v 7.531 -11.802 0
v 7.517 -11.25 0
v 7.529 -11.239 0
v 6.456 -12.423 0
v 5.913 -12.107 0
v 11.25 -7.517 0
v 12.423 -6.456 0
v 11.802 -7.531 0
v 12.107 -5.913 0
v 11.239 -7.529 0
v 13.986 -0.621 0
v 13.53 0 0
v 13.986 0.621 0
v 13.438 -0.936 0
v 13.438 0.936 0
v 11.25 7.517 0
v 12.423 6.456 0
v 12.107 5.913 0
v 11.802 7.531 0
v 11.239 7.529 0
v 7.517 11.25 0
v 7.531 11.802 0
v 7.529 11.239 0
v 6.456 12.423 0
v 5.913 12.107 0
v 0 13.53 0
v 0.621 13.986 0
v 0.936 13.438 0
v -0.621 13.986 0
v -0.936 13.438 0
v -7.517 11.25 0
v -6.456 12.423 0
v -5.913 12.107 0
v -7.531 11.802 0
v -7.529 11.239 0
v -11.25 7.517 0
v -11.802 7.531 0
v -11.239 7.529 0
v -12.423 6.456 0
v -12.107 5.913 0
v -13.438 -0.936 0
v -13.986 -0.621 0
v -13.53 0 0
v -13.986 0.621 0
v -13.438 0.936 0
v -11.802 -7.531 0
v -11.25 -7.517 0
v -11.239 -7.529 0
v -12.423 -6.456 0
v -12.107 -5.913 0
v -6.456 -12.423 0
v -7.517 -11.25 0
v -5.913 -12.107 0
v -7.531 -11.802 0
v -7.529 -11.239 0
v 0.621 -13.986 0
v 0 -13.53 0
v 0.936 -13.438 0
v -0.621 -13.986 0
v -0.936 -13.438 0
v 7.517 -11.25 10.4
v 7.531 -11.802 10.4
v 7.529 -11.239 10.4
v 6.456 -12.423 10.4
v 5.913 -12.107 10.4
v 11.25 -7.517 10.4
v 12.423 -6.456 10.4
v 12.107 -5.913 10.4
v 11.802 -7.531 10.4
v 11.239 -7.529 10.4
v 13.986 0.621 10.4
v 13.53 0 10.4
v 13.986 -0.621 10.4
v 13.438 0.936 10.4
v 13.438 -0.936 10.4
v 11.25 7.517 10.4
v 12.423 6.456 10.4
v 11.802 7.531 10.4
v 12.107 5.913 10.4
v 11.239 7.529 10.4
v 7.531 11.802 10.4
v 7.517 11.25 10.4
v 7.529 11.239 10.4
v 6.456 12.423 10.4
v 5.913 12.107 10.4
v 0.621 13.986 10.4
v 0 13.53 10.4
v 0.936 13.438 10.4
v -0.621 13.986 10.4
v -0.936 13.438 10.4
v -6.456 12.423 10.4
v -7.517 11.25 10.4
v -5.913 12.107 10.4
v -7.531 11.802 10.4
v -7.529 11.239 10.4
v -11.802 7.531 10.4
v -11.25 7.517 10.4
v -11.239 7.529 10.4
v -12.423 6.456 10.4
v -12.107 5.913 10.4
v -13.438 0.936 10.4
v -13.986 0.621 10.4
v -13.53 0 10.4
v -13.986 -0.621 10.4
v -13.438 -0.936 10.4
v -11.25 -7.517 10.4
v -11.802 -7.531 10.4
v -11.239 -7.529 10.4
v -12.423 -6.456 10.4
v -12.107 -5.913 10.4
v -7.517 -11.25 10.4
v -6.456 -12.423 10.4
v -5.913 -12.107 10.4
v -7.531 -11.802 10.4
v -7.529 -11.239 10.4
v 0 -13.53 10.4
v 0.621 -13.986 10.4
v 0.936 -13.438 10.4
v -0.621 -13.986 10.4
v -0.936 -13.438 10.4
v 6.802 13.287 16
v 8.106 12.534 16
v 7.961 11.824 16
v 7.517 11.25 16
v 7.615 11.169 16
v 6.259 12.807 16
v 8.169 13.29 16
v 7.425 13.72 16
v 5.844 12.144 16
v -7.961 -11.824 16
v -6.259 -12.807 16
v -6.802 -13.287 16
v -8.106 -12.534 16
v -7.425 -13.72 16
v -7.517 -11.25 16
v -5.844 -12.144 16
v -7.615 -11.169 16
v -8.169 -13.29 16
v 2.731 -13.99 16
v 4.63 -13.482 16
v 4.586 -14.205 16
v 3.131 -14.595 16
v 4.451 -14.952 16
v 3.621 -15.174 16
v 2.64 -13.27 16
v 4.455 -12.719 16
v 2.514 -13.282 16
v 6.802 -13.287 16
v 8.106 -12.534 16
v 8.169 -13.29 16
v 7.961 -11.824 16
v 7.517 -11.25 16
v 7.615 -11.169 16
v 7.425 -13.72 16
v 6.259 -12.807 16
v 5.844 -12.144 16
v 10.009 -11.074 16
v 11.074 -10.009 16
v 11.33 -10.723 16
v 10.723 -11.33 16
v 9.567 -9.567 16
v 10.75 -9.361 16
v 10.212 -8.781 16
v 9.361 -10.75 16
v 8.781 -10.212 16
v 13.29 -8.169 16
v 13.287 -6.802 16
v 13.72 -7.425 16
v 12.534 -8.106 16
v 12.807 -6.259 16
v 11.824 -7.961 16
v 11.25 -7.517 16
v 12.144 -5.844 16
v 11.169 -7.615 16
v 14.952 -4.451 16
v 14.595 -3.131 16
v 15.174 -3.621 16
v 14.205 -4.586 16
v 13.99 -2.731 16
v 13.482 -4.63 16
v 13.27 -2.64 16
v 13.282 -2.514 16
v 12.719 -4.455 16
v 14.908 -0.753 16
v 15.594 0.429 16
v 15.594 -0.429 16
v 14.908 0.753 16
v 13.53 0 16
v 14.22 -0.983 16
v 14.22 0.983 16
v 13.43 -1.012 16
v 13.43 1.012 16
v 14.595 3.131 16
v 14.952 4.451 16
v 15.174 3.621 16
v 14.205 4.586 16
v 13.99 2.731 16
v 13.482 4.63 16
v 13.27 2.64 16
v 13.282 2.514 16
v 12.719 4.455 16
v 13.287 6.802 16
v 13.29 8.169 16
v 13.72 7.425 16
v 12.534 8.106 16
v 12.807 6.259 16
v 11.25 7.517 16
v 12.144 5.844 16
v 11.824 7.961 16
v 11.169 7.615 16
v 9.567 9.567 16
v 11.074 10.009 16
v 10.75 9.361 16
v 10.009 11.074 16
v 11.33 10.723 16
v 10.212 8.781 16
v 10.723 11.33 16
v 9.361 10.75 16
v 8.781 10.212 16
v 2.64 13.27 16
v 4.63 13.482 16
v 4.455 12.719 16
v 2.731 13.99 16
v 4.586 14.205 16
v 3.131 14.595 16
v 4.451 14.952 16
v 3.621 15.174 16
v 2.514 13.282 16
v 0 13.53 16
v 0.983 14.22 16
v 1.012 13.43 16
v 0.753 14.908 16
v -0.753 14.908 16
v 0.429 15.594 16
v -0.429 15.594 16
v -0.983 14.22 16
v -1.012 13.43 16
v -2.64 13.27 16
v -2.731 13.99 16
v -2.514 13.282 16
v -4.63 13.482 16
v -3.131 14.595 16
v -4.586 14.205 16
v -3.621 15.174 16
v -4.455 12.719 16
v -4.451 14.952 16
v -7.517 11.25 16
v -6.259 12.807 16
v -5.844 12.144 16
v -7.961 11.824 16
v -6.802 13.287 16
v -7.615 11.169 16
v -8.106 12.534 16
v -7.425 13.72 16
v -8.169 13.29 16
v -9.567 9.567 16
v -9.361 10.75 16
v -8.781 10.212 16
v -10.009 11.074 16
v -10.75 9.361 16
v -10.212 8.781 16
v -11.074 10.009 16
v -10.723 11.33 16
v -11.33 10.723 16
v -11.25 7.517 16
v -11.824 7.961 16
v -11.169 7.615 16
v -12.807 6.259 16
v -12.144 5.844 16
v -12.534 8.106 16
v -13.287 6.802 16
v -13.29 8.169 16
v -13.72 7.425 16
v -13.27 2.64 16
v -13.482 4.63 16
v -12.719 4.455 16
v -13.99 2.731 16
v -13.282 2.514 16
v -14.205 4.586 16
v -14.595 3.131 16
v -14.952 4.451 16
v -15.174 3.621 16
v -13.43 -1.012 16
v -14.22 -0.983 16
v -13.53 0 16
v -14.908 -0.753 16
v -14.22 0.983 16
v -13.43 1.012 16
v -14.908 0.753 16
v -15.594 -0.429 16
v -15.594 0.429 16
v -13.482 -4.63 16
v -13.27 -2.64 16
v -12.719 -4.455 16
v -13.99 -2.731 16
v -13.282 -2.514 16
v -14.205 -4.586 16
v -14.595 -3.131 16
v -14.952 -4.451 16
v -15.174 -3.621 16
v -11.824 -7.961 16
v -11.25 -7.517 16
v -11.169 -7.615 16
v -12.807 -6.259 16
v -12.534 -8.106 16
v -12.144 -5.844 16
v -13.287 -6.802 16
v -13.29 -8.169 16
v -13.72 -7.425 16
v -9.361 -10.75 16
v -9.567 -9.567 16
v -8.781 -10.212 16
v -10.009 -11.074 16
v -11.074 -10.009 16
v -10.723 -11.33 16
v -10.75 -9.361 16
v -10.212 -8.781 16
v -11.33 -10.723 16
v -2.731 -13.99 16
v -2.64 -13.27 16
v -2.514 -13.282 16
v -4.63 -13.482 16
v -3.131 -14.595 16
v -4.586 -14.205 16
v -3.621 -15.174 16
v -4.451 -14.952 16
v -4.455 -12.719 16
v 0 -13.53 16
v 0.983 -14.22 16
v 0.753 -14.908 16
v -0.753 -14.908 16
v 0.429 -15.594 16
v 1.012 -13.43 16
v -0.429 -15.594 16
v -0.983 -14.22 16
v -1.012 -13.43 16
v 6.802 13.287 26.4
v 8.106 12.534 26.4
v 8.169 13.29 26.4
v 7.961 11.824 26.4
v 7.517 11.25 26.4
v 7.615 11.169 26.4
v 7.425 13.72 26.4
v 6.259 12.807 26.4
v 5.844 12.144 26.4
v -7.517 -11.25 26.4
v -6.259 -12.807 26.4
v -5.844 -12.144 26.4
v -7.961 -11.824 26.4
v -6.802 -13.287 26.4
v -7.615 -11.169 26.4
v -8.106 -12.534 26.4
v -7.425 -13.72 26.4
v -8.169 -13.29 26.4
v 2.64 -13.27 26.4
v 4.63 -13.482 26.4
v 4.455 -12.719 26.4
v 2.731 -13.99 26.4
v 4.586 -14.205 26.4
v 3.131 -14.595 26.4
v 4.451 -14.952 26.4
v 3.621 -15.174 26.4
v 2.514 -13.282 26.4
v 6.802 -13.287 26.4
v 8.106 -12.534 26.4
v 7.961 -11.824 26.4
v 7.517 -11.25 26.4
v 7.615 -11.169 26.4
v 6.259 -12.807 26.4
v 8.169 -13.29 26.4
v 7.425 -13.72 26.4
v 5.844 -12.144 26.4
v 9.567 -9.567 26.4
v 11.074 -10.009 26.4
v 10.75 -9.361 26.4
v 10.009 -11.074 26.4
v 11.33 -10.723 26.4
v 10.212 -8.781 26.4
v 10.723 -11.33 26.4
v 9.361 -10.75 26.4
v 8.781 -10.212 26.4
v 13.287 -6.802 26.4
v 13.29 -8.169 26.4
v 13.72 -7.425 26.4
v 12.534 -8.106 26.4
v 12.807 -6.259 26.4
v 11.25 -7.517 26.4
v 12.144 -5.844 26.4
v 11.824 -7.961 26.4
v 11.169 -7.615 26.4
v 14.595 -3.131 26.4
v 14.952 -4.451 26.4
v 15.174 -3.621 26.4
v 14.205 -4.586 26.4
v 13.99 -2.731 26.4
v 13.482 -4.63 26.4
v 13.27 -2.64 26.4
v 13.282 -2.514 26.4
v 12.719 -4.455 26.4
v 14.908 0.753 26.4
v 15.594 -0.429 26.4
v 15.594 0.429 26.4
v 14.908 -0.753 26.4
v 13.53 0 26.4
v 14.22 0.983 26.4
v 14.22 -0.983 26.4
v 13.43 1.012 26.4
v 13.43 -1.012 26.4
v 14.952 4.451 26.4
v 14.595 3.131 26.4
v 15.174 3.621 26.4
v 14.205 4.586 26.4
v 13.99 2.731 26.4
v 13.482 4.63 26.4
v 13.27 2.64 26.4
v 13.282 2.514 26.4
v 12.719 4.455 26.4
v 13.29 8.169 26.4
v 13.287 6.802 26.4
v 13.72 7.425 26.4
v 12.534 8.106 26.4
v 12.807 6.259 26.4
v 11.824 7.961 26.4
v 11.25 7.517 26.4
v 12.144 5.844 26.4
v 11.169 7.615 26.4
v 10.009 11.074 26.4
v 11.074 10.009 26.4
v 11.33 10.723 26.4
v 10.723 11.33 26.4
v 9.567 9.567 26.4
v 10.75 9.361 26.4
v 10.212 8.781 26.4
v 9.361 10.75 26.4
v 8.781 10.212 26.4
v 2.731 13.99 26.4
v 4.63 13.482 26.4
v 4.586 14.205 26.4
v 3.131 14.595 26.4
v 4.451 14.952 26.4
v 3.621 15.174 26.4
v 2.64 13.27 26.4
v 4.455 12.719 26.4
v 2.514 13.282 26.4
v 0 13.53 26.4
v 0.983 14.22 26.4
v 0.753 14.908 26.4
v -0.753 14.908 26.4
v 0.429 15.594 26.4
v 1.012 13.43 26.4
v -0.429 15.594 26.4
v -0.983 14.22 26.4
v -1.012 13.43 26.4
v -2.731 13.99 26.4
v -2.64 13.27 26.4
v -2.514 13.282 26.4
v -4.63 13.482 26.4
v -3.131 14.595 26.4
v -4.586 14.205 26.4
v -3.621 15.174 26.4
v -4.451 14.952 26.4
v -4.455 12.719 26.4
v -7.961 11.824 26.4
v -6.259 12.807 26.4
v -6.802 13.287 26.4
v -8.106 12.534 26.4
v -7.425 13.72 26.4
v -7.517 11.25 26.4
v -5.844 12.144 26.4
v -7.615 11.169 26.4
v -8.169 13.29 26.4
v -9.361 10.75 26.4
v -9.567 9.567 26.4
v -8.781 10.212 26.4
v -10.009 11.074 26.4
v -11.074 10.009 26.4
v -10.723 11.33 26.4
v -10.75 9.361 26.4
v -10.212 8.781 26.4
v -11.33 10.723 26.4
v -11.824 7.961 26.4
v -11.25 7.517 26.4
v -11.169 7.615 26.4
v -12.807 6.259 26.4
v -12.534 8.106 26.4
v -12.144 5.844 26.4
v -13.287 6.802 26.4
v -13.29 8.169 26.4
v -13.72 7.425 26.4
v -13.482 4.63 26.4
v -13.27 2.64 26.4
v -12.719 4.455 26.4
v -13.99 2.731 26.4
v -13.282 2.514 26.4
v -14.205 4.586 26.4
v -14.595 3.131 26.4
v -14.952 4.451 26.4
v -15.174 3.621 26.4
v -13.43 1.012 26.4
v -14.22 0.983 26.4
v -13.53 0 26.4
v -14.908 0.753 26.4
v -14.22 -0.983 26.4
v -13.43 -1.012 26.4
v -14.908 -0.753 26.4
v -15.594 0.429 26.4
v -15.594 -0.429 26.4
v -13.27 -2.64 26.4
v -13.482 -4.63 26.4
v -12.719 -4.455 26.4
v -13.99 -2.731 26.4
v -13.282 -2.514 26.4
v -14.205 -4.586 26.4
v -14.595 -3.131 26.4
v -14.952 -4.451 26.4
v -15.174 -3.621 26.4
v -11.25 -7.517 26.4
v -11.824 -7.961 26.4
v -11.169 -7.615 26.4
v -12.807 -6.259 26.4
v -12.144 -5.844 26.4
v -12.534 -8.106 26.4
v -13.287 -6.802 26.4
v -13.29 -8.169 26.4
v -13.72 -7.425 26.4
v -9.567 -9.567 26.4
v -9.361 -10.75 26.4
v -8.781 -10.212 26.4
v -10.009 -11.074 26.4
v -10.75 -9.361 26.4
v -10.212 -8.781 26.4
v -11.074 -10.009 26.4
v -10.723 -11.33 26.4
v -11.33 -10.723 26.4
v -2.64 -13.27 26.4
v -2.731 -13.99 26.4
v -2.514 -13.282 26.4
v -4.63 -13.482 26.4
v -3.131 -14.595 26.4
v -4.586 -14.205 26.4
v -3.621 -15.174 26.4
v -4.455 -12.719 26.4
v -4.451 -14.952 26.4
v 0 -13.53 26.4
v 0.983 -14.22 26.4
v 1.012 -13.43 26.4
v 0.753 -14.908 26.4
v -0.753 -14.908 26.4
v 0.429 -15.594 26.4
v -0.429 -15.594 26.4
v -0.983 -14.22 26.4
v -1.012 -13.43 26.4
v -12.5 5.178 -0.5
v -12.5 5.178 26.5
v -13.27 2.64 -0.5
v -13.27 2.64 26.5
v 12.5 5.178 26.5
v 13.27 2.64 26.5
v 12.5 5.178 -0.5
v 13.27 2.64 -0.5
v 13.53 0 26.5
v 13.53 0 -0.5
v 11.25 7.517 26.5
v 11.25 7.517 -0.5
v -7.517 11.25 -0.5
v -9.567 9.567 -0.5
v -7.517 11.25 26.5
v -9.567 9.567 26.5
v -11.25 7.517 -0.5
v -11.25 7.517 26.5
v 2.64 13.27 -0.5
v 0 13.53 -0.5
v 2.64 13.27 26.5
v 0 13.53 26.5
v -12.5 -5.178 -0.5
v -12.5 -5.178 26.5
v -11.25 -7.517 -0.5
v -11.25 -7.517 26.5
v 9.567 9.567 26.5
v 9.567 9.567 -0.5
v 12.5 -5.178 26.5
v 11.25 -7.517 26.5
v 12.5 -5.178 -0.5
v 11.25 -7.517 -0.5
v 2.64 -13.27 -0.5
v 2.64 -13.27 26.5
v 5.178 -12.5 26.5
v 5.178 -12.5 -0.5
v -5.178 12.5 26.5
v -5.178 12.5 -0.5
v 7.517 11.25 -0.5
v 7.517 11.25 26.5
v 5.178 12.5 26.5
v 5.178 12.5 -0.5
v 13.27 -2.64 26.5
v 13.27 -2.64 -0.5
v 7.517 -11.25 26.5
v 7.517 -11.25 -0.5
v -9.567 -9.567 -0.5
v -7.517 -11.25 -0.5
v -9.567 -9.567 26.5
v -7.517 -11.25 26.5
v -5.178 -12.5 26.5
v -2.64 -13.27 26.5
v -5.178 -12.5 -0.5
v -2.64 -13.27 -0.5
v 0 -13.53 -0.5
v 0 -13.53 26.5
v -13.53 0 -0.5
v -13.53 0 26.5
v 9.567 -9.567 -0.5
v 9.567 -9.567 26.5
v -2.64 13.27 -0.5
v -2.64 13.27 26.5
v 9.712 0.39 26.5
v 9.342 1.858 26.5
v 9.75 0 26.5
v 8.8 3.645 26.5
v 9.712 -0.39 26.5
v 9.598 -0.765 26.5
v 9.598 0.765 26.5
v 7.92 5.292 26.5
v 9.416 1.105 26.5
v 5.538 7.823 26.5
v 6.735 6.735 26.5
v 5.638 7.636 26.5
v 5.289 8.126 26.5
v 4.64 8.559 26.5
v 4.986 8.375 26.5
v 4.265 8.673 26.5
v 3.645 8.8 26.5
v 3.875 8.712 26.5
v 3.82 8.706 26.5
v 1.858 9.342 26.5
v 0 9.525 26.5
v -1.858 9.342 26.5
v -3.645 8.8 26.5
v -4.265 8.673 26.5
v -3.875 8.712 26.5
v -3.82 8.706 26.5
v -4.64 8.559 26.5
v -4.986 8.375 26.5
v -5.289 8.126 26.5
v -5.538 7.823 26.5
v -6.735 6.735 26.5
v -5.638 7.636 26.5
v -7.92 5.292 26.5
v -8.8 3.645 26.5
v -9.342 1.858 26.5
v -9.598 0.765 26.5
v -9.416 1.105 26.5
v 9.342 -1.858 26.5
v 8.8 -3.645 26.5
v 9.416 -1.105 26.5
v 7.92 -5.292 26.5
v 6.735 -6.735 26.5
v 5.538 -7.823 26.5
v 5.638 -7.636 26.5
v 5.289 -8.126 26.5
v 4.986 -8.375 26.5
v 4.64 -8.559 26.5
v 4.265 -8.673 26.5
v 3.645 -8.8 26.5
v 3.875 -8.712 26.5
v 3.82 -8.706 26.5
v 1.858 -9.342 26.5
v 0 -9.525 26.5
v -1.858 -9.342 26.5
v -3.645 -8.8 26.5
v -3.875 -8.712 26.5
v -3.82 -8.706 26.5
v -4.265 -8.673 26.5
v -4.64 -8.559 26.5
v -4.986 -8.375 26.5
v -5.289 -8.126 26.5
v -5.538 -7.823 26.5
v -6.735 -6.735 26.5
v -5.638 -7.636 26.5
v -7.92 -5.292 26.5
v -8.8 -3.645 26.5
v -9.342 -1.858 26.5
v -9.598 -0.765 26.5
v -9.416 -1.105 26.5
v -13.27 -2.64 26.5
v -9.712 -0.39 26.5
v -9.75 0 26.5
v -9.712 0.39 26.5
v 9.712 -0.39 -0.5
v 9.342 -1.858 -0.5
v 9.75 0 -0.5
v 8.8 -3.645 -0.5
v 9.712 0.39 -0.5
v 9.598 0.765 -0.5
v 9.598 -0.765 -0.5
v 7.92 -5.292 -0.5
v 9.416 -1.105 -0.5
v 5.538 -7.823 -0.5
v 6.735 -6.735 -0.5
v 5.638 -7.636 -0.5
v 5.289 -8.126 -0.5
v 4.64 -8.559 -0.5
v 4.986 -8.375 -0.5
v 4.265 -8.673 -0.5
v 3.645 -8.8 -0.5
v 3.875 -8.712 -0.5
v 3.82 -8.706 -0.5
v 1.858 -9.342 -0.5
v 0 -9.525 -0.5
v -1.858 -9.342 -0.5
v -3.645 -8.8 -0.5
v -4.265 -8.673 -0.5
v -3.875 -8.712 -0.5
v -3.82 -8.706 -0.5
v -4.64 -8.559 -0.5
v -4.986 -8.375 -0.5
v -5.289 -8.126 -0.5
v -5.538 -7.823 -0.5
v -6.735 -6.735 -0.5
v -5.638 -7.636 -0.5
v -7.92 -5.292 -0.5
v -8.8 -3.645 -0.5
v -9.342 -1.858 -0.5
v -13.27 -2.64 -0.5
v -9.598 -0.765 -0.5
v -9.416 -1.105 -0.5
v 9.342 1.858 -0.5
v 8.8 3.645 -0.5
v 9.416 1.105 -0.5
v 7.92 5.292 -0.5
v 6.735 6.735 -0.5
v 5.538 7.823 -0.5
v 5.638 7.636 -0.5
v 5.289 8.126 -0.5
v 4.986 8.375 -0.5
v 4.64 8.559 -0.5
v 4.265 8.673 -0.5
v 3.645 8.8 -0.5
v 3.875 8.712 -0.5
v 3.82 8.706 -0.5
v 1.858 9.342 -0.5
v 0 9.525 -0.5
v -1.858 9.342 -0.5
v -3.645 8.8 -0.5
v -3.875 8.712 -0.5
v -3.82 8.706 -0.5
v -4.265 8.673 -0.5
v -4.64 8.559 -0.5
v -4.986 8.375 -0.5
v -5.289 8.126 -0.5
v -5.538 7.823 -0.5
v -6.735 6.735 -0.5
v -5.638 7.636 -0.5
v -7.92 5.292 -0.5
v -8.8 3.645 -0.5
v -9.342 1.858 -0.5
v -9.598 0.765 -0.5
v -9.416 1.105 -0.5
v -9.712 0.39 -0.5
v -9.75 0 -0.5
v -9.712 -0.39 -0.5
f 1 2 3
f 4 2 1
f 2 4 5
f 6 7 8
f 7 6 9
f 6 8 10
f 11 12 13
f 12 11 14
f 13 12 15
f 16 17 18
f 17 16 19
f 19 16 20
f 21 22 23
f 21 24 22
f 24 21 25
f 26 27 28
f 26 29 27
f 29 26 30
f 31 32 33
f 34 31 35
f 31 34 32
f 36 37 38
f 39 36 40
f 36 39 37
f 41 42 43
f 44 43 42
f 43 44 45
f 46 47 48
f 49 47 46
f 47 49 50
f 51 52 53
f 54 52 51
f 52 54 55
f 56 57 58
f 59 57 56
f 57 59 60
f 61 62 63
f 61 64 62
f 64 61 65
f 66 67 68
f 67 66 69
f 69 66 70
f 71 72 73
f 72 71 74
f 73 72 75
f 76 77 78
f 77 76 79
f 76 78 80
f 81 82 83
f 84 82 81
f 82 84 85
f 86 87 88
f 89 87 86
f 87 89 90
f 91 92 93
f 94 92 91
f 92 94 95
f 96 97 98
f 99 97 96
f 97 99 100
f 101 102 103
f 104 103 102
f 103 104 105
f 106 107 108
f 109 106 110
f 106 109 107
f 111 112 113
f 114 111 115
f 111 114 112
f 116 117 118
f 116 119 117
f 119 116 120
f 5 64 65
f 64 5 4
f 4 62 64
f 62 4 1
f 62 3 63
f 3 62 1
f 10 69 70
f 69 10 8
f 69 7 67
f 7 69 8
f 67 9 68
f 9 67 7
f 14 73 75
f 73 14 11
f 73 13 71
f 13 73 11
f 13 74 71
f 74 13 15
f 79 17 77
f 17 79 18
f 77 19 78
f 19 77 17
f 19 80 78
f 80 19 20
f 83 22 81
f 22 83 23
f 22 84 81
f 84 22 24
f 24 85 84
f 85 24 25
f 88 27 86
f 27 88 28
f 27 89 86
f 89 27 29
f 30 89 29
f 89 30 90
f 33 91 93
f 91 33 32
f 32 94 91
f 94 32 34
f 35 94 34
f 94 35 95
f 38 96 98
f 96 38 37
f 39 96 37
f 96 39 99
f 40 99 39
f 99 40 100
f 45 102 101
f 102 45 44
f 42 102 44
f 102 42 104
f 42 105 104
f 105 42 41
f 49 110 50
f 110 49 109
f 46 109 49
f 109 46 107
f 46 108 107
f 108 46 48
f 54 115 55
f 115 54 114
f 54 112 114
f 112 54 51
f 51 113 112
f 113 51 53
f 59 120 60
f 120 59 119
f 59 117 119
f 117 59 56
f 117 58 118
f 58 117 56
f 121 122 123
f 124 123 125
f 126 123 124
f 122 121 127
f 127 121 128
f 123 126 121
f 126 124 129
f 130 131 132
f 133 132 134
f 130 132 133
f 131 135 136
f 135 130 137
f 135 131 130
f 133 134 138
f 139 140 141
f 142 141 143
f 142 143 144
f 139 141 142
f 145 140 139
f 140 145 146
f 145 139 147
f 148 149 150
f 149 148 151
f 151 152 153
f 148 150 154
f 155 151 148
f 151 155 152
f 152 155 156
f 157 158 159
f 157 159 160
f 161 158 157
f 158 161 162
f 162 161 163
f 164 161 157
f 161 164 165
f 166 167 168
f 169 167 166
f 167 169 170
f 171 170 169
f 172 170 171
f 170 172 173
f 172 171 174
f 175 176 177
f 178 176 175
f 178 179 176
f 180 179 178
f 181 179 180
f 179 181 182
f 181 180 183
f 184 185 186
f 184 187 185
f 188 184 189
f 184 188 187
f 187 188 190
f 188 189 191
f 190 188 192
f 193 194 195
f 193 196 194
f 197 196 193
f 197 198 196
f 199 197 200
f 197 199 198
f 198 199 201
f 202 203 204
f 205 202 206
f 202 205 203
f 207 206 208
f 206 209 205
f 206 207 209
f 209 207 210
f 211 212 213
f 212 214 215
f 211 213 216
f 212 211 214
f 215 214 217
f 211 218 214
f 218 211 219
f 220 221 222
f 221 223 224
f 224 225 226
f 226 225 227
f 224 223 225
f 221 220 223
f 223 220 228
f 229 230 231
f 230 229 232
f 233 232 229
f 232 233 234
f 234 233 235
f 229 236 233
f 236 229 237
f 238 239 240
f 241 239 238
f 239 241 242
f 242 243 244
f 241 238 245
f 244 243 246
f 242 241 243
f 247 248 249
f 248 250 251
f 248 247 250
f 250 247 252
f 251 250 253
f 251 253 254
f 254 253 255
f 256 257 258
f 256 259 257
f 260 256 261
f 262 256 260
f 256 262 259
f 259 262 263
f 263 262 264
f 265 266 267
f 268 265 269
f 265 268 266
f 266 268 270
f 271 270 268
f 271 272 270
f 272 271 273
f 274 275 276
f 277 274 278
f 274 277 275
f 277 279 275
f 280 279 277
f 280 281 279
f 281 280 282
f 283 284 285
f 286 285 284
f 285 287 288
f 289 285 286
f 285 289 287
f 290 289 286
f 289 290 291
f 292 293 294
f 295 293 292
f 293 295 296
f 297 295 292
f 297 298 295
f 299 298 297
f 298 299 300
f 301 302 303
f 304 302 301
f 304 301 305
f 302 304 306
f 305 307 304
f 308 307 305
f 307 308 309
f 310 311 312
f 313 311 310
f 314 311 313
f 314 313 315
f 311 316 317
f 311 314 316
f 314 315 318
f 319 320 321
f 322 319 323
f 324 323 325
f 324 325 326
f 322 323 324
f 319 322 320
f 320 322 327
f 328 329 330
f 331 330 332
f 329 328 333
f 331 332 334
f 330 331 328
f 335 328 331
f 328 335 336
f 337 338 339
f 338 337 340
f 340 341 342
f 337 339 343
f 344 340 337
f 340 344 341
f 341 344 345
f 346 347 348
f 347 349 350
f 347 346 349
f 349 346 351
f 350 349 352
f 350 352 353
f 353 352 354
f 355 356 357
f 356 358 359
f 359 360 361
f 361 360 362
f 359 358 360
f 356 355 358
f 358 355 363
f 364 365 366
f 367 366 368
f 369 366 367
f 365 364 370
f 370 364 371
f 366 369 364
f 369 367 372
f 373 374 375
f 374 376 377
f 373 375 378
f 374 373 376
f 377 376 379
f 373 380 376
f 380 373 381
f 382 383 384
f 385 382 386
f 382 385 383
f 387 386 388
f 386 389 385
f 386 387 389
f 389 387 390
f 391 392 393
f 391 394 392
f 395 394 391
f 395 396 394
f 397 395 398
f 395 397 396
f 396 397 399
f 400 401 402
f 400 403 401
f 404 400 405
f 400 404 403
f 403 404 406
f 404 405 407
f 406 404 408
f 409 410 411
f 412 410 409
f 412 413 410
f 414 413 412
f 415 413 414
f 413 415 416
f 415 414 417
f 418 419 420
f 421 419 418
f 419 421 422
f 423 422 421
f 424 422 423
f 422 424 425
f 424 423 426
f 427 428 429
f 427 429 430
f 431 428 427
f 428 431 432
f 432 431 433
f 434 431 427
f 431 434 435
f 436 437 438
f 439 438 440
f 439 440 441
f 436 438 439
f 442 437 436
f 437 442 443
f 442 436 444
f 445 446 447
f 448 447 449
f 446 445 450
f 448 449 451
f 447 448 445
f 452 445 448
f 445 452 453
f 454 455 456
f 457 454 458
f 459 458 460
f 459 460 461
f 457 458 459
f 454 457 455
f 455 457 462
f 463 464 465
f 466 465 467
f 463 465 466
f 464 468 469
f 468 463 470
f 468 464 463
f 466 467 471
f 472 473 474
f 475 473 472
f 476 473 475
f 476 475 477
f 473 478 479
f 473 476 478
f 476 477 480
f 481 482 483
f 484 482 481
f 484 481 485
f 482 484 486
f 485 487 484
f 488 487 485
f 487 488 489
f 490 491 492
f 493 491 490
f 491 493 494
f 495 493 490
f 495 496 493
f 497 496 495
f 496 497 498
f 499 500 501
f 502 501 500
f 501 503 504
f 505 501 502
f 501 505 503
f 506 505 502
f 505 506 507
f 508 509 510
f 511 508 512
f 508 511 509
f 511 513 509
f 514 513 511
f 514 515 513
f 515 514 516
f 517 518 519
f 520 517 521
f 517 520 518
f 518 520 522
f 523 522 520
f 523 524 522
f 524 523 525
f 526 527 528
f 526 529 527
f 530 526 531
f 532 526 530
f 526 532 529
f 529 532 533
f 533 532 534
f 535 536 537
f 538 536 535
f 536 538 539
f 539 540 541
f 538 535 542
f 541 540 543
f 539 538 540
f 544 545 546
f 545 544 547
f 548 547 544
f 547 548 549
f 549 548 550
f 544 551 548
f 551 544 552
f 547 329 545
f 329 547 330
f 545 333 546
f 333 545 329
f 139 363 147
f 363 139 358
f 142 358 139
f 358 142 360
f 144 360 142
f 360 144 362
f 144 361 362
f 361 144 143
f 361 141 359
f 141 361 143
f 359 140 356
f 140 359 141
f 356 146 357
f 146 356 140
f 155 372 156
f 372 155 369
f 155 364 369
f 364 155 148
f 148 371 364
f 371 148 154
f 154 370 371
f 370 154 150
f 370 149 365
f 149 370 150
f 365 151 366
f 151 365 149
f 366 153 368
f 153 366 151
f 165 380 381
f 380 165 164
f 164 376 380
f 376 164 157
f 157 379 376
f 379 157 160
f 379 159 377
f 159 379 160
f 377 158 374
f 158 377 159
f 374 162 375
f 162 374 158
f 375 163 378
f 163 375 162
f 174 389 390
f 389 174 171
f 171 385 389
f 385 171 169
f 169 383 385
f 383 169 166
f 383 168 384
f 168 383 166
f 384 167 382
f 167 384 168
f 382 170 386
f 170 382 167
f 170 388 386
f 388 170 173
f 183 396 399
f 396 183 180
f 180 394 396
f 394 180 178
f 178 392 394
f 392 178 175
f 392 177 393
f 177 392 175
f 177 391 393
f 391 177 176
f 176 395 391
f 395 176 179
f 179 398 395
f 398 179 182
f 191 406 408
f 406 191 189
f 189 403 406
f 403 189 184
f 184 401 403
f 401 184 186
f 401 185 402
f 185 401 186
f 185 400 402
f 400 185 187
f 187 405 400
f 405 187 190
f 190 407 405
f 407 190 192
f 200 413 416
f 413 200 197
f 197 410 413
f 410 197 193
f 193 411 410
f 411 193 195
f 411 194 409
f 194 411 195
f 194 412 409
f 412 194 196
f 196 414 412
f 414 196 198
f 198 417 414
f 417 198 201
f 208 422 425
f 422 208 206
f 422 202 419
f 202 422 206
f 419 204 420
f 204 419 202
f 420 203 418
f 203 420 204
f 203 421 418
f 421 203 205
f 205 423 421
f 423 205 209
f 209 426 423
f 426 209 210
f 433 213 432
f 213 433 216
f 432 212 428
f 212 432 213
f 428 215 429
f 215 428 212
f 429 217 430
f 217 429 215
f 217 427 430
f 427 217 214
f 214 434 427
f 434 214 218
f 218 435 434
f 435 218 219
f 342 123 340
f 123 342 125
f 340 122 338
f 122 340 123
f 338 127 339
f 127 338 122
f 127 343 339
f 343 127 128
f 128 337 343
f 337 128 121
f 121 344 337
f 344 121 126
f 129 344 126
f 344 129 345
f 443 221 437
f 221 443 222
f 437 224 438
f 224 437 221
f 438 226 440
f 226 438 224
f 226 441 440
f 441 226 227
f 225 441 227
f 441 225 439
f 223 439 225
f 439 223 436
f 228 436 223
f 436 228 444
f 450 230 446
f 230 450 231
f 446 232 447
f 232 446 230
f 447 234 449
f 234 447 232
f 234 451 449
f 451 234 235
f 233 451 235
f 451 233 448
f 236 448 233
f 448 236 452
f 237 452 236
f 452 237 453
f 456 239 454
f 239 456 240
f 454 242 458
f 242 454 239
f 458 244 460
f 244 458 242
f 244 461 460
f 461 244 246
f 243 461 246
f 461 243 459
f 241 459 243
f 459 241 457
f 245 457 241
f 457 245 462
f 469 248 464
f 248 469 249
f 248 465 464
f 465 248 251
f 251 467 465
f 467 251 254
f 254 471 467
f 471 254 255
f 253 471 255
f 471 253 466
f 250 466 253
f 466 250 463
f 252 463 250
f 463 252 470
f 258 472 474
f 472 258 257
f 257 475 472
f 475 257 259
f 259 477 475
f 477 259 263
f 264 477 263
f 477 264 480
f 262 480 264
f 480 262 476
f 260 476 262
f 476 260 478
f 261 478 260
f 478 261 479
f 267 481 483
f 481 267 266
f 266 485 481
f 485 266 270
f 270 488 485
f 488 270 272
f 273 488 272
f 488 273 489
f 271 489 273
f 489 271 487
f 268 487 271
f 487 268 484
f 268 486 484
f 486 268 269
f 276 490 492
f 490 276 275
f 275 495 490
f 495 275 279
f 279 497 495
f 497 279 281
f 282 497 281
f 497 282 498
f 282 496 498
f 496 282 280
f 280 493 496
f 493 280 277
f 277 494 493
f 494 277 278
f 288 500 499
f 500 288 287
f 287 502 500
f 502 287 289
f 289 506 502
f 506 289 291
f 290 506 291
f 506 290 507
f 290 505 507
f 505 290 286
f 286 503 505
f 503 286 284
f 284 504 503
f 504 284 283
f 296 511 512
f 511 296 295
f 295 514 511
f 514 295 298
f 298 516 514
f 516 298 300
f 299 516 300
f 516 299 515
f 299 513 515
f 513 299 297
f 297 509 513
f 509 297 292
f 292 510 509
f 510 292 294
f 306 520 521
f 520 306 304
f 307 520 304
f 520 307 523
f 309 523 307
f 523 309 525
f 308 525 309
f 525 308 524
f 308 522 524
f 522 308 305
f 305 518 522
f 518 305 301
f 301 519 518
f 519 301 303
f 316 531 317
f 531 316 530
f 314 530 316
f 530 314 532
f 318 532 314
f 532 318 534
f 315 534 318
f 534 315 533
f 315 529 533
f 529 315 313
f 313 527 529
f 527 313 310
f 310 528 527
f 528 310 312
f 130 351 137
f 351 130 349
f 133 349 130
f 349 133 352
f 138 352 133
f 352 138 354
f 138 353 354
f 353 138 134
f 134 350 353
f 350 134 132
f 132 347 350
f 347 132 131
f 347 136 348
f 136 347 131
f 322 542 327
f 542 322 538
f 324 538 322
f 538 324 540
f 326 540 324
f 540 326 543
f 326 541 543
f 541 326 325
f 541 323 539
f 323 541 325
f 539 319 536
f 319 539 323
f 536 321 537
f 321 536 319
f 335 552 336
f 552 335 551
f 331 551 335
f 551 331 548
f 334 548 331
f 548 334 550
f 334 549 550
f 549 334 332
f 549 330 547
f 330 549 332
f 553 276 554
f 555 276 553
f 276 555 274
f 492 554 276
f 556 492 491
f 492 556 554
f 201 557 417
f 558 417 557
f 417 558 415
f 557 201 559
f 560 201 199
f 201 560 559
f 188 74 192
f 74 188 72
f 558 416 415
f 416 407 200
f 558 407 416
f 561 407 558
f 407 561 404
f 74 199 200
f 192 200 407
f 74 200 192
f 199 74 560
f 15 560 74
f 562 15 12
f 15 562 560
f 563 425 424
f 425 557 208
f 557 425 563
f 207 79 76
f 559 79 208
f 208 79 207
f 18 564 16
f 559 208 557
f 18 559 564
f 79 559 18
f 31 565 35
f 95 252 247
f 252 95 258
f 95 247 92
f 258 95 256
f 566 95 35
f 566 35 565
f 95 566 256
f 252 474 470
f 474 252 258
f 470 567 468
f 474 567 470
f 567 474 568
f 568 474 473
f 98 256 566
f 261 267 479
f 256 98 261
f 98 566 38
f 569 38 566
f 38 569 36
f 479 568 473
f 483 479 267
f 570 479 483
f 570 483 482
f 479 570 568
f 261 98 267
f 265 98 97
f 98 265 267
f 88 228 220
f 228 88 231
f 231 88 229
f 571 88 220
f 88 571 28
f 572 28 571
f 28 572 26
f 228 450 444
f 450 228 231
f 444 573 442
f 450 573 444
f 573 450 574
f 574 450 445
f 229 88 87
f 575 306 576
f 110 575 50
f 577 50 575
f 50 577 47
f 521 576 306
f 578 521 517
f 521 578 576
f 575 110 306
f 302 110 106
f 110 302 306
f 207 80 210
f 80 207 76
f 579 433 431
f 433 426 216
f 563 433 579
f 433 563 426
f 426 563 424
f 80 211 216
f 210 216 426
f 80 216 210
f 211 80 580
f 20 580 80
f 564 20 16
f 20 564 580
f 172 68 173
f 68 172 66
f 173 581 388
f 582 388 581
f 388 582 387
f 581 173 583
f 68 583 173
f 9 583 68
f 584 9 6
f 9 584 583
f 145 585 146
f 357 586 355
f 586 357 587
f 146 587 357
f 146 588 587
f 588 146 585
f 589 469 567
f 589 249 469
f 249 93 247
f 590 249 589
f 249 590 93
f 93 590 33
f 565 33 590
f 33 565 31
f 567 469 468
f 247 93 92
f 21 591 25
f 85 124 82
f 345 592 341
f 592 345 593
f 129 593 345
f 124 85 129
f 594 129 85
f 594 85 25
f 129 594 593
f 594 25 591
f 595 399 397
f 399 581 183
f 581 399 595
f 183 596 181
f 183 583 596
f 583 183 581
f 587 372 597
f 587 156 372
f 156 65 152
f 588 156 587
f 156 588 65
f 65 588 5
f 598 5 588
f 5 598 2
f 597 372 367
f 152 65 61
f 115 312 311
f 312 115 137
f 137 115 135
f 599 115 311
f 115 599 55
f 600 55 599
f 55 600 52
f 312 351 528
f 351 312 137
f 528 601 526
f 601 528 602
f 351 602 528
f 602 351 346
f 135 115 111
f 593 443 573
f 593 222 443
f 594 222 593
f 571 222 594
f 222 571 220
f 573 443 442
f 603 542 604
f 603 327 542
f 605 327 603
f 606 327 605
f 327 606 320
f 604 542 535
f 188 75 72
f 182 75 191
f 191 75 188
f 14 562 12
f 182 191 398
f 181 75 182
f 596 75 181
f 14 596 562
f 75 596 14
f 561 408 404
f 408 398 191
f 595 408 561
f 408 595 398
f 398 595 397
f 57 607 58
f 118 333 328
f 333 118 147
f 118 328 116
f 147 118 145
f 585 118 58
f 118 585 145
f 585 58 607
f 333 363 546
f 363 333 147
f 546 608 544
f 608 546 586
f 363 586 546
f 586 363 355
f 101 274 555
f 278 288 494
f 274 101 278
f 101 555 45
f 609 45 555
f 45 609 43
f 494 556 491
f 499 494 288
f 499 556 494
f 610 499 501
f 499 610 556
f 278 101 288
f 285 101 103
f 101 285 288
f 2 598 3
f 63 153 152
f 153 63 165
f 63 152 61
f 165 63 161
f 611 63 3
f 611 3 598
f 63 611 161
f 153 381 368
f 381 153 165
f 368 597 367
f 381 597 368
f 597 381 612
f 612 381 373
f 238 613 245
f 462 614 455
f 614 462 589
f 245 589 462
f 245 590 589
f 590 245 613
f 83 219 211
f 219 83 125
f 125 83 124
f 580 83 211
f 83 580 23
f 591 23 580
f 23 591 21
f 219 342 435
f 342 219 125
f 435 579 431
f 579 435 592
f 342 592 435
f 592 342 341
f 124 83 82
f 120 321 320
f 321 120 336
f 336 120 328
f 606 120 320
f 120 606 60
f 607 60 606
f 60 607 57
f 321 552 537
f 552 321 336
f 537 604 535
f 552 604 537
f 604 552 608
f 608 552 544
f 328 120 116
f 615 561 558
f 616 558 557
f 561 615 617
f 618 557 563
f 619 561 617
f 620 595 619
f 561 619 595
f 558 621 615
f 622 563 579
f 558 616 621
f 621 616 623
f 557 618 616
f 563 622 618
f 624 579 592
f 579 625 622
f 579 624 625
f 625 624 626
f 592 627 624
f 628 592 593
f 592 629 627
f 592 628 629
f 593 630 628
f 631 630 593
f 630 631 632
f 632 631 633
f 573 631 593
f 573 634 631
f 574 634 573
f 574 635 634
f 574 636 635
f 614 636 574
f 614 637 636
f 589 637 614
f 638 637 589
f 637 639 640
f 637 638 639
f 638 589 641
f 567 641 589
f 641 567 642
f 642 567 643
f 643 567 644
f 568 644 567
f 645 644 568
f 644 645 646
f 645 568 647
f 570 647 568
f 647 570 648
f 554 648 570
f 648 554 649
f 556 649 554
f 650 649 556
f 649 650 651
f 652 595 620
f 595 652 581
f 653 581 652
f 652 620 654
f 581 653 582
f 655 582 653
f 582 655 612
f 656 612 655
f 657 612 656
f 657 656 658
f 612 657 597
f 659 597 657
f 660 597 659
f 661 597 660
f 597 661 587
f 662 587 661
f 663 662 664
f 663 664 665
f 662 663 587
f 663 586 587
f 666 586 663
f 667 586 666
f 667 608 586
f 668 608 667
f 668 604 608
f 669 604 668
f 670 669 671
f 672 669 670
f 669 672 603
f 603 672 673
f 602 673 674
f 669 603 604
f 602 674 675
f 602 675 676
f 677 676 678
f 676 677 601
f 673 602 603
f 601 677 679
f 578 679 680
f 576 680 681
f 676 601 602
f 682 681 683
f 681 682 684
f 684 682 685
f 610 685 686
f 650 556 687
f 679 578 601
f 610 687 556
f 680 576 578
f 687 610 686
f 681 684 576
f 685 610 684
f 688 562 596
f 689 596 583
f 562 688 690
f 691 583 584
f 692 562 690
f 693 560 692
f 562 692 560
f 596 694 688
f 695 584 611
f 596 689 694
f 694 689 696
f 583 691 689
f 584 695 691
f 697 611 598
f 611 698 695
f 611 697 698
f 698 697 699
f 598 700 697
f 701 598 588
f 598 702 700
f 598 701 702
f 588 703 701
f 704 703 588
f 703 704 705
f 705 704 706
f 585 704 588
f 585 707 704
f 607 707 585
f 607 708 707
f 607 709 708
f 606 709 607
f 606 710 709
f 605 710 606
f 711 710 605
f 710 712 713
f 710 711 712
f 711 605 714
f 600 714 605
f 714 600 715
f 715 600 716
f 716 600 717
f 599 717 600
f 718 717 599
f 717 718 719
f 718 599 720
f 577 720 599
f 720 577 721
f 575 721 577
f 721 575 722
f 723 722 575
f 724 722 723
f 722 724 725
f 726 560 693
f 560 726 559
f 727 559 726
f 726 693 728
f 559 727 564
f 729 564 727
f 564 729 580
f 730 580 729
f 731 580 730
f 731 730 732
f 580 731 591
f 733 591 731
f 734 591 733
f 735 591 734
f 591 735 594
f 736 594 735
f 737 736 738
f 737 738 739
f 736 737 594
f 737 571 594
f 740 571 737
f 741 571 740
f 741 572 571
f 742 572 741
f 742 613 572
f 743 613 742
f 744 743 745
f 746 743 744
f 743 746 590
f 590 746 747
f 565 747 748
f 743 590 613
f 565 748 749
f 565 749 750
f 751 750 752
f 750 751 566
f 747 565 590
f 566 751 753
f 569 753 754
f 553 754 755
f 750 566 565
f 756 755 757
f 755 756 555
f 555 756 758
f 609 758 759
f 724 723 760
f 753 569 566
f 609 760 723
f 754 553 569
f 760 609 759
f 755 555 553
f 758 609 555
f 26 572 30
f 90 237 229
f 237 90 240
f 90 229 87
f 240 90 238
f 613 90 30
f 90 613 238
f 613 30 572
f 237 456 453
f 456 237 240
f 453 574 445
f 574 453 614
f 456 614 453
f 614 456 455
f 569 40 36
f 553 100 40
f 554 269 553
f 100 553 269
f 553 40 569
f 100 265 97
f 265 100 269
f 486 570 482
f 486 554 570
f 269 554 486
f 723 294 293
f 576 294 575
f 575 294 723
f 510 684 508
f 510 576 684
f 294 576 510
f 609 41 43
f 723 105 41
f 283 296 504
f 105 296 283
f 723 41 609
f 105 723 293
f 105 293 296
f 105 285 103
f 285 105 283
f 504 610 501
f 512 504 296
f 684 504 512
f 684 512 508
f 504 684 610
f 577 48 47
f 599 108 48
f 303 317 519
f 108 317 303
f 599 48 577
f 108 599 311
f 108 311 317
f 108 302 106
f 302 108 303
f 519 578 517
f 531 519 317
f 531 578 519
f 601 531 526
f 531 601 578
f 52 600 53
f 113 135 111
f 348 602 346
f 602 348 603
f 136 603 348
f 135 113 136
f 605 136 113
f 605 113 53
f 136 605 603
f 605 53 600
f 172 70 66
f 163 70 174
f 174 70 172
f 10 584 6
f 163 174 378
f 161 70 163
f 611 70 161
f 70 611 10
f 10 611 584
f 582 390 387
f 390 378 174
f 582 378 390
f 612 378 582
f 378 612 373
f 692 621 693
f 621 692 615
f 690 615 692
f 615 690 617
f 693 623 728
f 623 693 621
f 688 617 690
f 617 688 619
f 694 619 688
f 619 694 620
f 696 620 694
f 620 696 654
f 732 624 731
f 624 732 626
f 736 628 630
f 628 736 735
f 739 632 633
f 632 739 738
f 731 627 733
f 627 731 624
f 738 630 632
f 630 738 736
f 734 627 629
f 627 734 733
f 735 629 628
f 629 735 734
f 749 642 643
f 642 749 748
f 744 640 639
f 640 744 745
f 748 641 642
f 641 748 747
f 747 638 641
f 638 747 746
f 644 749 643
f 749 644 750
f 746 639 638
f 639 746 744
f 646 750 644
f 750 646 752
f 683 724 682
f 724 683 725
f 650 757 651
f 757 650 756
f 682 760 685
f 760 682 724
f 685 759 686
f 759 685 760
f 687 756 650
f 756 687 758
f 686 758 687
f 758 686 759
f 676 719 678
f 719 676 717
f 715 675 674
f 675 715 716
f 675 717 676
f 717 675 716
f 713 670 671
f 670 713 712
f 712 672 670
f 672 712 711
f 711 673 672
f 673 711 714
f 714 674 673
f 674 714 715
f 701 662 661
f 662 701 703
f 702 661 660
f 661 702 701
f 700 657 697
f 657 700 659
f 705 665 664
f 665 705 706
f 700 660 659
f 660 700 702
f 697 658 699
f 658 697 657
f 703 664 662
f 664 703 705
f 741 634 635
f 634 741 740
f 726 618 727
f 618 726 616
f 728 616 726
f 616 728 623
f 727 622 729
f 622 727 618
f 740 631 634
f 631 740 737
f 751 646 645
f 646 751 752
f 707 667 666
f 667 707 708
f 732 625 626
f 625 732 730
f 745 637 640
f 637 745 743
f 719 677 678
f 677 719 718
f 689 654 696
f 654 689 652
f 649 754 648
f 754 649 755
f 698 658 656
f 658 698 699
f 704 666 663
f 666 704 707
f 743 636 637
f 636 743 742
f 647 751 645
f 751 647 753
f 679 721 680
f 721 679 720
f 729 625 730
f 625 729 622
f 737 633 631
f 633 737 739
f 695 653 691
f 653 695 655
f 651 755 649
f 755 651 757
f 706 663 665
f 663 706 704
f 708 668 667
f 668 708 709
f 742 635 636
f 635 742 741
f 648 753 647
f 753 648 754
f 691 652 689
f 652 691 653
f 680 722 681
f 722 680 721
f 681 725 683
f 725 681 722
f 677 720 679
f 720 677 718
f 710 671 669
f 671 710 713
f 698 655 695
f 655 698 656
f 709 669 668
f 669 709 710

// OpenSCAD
$fn = 32;

// ----------------------------------------------------------------------
// Two-module gear rim: z12 m2 and z24 m1.2, 26 mm wide
// ----------------------------------------------------------------------

// --- parameters (mm) ---
module_a = 2;             // first tooth module
teeth_a = 12;             // first band tooth count
module_b = 1.2;           // second tooth module
teeth_b = 24;             // second band tooth count
band_h = 10;              // height of one tooth band
web_t = 6;                // web thickness between the bands
total = 26;               // overall width over both bands
root_r = 9.5;             // root radius of the coarse band
hub_r = 13.53;            // hub radius
bore_d = 19.05;           // hub bore
hole_count = 6;           // lightening holes
hole_r = 7.75;            // lightening hole circle radius
hole_d = 4;               // lightening hole diameter

band_a = [[9.4, -1.378], [12.124, -1.51], [13.058, -1.154], [13.986, -0.621], [13.986, 0.621], [13.058, 1.154], [12.124, 1.51], [9.4, 1.378], [8.829, 3.507], [11.254, 4.755], [11.885, 5.53], [12.423, 6.456], [11.802, 7.531], [10.732, 7.528], [9.745, 7.369], [7.451, 5.893], [5.893, 7.451], [7.369, 9.745], [7.528, 10.732], [7.531, 11.802], [6.456, 12.423], [5.53, 11.885], [4.755, 11.254], [3.507, 8.829], [1.378, 9.4], [1.51, 12.124], [1.154, 13.058], [0.621, 13.986], [-0.621, 13.986], [-1.154, 13.058], [-1.51, 12.124], [-1.378, 9.4], [-3.507, 8.829], [-4.755, 11.254], [-5.53, 11.885], [-6.456, 12.423], [-7.531, 11.802], [-7.528, 10.732], [-7.369, 9.745], [-5.893, 7.451], [-7.451, 5.893], [-9.745, 7.369], [-10.732, 7.528], [-11.802, 7.531], [-12.423, 6.456], [-11.885, 5.53], [-11.254, 4.755], [-8.829, 3.507], [-9.4, 1.378], [-12.124, 1.51], [-13.058, 1.154], [-13.986, 0.621], [-13.986, -0.621], [-13.058, -1.154], [-12.124, -1.51], [-9.4, -1.378], [-8.829, -3.507], [-11.254, -4.755], [-11.885, -5.53], [-12.423, -6.456], [-11.802, -7.531], [-10.732, -7.528], [-9.745, -7.369], [-7.451, -5.893], [-5.893, -7.451], [-7.369, -9.745], [-7.528, -10.732], [-7.531, -11.802], [-6.456, -12.423], [-5.53, -11.885], [-4.755, -11.254], [-3.507, -8.829], [-1.378, -9.4], [-1.51, -12.124], [-1.154, -13.058], [-0.621, -13.986], [0.621, -13.986], [1.154, -13.058], [1.51, -12.124], [1.378, -9.4], [3.507, -8.829], [4.755, -11.254], [5.53, -11.885], [6.456, -12.423], [7.531, -11.802], [7.528, -10.732], [7.369, -9.745], [5.893, -7.451], [7.451, -5.893], [9.745, -7.369], [10.732, -7.528], [11.802, -7.531], [12.423, -6.456], [11.885, -5.53], [11.254, -4.755], [8.829, -3.507]];
band_b = [[12.859, -1.033], [14.22, -0.983], [14.908, -0.753], [15.594, -0.429], [15.594, 0.429], [14.908, 0.753], [14.22, 0.983], [12.859, 1.033], [12.688, 2.331], [13.99, 2.731], [14.595, 3.131], [15.174, 3.621], [14.952, 4.451], [14.205, 4.586], [13.482, 4.63], [12.153, 4.326], [11.652, 5.535], [12.807, 6.259], [13.287, 6.802], [13.72, 7.425], [13.29, 8.169], [12.534, 8.106], [11.824, 7.961], [10.62, 7.324], [9.823, 8.362], [10.75, 9.361], [11.074, 10.009], [11.33, 10.723], [10.723, 11.33], [10.009, 11.074], [9.361, 10.75], [8.362, 9.823], [7.324, 10.62], [7.961, 11.824], [8.106, 12.534], [8.169, 13.29], [7.425, 13.72], [6.802, 13.287], [6.259, 12.807], [5.535, 11.652], [4.326, 12.153], [4.63, 13.482], [4.586, 14.205], [4.451, 14.952], [3.621, 15.174], [3.131, 14.595], [2.731, 13.99], [2.331, 12.688], [1.033, 12.859], [0.983, 14.22], [0.753, 14.908], [0.429, 15.594], [-0.429, 15.594], [-0.753, 14.908], [-0.983, 14.22], [-1.033, 12.859], [-2.331, 12.688], [-2.731, 13.99], [-3.131, 14.595], [-3.621, 15.174], [-4.451, 14.952], [-4.586, 14.205], [-4.63, 13.482], [-4.326, 12.153], [-5.535, 11.652], [-6.259, 12.807], [-6.802, 13.287], [-7.425, 13.72], [-8.169, 13.29], [-8.106, 12.534], [-7.961, 11.824], [-7.324, 10.62], [-8.362, 9.823], [-9.361, 10.75], [-10.009, 11.074], [-10.723, 11.33], [-11.33, 10.723], [-11.074, 10.009], [-10.75, 9.361], [-9.823, 8.362], [-10.62, 7.324], [-11.824, 7.961], [-12.534, 8.106], [-13.29, 8.169], [-13.72, 7.425], [-13.287, 6.802], [-12.807, 6.259], [-11.652, 5.535], [-12.153, 4.326], [-13.482, 4.63], [-14.205, 4.586], [-14.952, 4.451], [-15.174, 3.621], [-14.595, 3.131], [-13.99, 2.731], [-12.688, 2.331], [-12.859, 1.033], [-14.22, 0.983], [-14.908, 0.753], [-15.594, 0.429], [-15.594, -0.429], [-14.908, -0.753], [-14.22, -0.983], [-12.859, -1.033], [-12.688, -2.331], [-13.99, -2.731], [-14.595, -3.131], [-15.174, -3.621], [-14.952, -4.451], [-14.205, -4.586], [-13.482, -4.63], [-12.153, -4.326], [-11.652, -5.535], [-12.807, -6.259], [-13.287, -6.802], [-13.72, -7.425], [-13.29, -8.169], [-12.534, -8.106], [-11.824, -7.961], [-10.62, -7.324], [-9.823, -8.362], [-10.75, -9.361], [-11.074, -10.009], [-11.33, -10.723], [-10.723, -11.33], [-10.009, -11.074], [-9.361, -10.75], [-8.362, -9.823], [-7.324, -10.62], [-7.961, -11.824], [-8.106, -12.534], [-8.169, -13.29], [-7.425, -13.72], [-6.802, -13.287], [-6.259, -12.807], [-5.535, -11.652], [-4.326, -12.153], [-4.63, -13.482], [-4.586, -14.205], [-4.451, -14.952], [-3.621, -15.174], [-3.131, -14.595], [-2.731, -13.99], [-2.331, -12.688], [-1.033, -12.859], [-0.983, -14.22], [-0.753, -14.908], [-0.429, -15.594], [0.429, -15.594], [0.753, -14.908], [0.983, -14.22], [1.033, -12.859], [2.331, -12.688], [2.731, -13.99], [3.131, -14.595], [3.621, -15.174], [4.451, -14.952], [4.586, -14.205], [4.63, -13.482], [4.326, -12.153], [5.535, -11.652], [6.259, -12.807], [6.802, -13.287], [7.425, -13.72], [8.169, -13.29], [8.106, -12.534], [7.961, -11.824], [7.324, -10.62], [8.362, -9.823], [9.361, -10.75], [10.009, -11.074], [10.723, -11.33], [11.33, -10.723], [11.074, -10.009], [10.75, -9.361], [9.823, -8.362], [10.62, -7.324], [11.824, -7.961], [12.534, -8.106], [13.29, -8.169], [13.72, -7.425], [13.287, -6.802], [12.807, -6.259], [11.652, -5.535], [12.153, -4.326], [13.482, -4.63], [14.205, -4.586], [14.952, -4.451], [15.174, -3.621], [14.595, -3.131], [13.99, -2.731], [12.688, -2.331]];

difference() {
  union() {
    /* tooth band A, overlapping the web by 0.4 mm */
    linear_extrude(height = band_h + 0.4) polygon(band_a);
    /* web */
    translate([0, 0, band_h - 0.4]) cylinder(h = web_t + 0.8, d = 2 * root_r);
    /* tooth band B */
    translate([0, 0, band_h + web_t]) linear_extrude(height = band_h + 0.4) polygon(band_b);
    /* hub */
    translate([0, 0, -0.5]) cylinder(h = total + 1.0, d = 2 * hub_r);
  }
  /* bore */
  translate([0, 0, -2.5]) cylinder(h = total + 5, d = bore_d);
  /* lightening holes through the web */
  for (i = [0 : hole_count - 1]) {
    a = i * 360 / hole_count;
    translate([hole_r * cos(a), hole_r * sin(a), -2.5]) cylinder(h = total + 5, d = hole_d);
  }
}
